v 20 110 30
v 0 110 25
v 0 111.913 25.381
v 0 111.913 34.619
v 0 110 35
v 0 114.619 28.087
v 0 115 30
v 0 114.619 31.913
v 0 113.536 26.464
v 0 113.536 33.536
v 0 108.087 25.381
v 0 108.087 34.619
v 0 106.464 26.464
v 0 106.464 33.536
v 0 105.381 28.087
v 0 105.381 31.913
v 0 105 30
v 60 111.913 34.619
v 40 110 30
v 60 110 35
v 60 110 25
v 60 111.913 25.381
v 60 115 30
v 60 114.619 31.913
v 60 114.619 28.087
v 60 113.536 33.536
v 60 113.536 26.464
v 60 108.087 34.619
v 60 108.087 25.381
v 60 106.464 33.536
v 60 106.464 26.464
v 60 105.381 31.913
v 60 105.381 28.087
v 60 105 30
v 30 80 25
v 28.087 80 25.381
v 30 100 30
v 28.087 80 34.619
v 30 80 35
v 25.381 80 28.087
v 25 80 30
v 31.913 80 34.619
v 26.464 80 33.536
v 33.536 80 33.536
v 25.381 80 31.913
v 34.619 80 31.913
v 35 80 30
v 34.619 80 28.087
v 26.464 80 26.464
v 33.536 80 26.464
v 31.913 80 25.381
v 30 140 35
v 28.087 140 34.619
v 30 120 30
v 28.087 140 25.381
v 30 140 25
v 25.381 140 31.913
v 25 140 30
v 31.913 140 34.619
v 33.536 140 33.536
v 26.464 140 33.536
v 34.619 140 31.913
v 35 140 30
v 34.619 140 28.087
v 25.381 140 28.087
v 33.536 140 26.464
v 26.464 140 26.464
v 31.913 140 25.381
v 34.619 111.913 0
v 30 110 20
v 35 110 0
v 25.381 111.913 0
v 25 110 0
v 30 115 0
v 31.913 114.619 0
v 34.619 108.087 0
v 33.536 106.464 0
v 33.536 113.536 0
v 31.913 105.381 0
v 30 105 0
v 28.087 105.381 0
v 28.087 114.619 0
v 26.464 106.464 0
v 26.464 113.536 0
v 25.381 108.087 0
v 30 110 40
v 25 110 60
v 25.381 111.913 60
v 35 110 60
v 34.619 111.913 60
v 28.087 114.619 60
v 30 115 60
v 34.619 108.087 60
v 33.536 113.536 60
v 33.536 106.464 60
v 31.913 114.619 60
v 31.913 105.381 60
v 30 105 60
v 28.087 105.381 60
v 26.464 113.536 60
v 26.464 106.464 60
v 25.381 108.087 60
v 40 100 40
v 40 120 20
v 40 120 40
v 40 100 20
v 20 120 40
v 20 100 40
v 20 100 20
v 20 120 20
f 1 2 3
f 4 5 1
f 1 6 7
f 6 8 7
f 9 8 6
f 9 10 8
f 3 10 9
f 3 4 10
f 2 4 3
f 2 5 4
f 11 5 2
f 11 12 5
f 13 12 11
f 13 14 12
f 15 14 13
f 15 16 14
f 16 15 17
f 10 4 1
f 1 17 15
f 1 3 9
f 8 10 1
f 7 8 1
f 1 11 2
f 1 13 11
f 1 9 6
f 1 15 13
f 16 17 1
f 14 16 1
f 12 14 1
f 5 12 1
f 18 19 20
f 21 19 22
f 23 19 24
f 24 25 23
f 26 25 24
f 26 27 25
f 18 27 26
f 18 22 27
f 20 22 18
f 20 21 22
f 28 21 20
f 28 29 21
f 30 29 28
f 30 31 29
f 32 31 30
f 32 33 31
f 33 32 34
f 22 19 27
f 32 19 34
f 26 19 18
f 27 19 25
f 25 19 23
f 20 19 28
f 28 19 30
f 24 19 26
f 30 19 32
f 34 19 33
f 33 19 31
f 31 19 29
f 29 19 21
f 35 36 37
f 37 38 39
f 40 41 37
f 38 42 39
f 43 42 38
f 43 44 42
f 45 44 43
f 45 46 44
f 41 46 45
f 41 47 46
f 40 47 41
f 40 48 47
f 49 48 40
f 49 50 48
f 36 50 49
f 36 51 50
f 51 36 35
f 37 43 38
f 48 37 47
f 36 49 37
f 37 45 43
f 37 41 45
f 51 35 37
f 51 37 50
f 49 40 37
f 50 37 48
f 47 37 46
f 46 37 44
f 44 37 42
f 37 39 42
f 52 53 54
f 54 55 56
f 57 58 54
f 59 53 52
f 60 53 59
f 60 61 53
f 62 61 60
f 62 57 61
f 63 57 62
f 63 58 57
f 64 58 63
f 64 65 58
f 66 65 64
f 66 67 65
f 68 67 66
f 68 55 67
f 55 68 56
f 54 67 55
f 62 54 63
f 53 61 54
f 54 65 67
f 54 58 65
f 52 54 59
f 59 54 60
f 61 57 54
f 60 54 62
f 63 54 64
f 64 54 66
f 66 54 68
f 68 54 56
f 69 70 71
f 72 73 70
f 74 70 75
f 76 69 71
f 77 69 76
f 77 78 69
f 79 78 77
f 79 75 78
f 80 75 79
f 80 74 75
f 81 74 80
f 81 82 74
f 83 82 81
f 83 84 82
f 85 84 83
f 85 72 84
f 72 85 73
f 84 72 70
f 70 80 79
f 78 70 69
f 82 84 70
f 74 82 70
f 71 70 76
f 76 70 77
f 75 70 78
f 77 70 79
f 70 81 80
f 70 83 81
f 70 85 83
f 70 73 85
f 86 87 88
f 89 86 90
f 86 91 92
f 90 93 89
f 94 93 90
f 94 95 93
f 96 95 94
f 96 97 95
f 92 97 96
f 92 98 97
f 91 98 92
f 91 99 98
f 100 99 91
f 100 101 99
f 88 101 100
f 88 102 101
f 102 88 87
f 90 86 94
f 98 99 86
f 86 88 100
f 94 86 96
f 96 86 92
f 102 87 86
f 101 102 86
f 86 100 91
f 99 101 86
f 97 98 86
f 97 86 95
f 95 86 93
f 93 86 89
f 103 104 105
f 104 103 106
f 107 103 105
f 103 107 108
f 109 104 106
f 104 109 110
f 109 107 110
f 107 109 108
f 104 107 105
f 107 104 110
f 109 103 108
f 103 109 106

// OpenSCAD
// file: measurement.scad
/*
   dist is along x
*/

module x_measurement_impl(dist)
{
  if ( dist >= 0){
     translate([-20,0,0]){
        rotate([0,90,0]){
            cylinder(r1 = 5, r2= 0, h = 20);
        }
     }
     translate([dist +20,0,0]){
        rotate([0,-90,0]){
            cylinder(r1 = 5, r2= 0, h = 20);
        }
     }
   } else{
     translate([20,0,0]){
        rotate([0,-90,0]){
            cylinder(r1 = 5, r2= 0, h = 20);
        }
     }
     translate([dist-20,0,0]){
        rotate([0,90,0]){
            cylinder(r2 = 0, r1= 5, h = 20);
        }
     }
   }
}

/*
   dist is along x, pos is 3d starting coord
*/

module x_measurement(dist, pos = [0,0,0])
{
   translate(pos){
     x_measurement_impl(dist);
   }
}

/*
   dist is along y, pos is 3d starting coord
*/
module y_measurement(dist, pos = [0,0,0])
{
   translate(pos){
      rotate([0,0,90]){
         x_measurement_impl(dist);
      }
   }
}

/*
   dist is along z, pos is 3d starting coord
*/

module z_measurement(dist, pos = [0,0,0])
{
   translate(pos){
      rotate([0,-90,0]){
         x_measurement_impl(dist);
      }
   }
}

//y_measurement(-5,[10,0,0]);
// main file
//example.scad

use <measurement.scad>

pos = [20,100,20];
translate(pos){
   cube([20,20,20]);
   
   color("blue")
     x_measurement(20,[0,10,10]);
     
   color("red")
     y_measurement(20,[10,0,10]);
     
   color("green")
     z_measurement(20,[10,10,0]);
}
